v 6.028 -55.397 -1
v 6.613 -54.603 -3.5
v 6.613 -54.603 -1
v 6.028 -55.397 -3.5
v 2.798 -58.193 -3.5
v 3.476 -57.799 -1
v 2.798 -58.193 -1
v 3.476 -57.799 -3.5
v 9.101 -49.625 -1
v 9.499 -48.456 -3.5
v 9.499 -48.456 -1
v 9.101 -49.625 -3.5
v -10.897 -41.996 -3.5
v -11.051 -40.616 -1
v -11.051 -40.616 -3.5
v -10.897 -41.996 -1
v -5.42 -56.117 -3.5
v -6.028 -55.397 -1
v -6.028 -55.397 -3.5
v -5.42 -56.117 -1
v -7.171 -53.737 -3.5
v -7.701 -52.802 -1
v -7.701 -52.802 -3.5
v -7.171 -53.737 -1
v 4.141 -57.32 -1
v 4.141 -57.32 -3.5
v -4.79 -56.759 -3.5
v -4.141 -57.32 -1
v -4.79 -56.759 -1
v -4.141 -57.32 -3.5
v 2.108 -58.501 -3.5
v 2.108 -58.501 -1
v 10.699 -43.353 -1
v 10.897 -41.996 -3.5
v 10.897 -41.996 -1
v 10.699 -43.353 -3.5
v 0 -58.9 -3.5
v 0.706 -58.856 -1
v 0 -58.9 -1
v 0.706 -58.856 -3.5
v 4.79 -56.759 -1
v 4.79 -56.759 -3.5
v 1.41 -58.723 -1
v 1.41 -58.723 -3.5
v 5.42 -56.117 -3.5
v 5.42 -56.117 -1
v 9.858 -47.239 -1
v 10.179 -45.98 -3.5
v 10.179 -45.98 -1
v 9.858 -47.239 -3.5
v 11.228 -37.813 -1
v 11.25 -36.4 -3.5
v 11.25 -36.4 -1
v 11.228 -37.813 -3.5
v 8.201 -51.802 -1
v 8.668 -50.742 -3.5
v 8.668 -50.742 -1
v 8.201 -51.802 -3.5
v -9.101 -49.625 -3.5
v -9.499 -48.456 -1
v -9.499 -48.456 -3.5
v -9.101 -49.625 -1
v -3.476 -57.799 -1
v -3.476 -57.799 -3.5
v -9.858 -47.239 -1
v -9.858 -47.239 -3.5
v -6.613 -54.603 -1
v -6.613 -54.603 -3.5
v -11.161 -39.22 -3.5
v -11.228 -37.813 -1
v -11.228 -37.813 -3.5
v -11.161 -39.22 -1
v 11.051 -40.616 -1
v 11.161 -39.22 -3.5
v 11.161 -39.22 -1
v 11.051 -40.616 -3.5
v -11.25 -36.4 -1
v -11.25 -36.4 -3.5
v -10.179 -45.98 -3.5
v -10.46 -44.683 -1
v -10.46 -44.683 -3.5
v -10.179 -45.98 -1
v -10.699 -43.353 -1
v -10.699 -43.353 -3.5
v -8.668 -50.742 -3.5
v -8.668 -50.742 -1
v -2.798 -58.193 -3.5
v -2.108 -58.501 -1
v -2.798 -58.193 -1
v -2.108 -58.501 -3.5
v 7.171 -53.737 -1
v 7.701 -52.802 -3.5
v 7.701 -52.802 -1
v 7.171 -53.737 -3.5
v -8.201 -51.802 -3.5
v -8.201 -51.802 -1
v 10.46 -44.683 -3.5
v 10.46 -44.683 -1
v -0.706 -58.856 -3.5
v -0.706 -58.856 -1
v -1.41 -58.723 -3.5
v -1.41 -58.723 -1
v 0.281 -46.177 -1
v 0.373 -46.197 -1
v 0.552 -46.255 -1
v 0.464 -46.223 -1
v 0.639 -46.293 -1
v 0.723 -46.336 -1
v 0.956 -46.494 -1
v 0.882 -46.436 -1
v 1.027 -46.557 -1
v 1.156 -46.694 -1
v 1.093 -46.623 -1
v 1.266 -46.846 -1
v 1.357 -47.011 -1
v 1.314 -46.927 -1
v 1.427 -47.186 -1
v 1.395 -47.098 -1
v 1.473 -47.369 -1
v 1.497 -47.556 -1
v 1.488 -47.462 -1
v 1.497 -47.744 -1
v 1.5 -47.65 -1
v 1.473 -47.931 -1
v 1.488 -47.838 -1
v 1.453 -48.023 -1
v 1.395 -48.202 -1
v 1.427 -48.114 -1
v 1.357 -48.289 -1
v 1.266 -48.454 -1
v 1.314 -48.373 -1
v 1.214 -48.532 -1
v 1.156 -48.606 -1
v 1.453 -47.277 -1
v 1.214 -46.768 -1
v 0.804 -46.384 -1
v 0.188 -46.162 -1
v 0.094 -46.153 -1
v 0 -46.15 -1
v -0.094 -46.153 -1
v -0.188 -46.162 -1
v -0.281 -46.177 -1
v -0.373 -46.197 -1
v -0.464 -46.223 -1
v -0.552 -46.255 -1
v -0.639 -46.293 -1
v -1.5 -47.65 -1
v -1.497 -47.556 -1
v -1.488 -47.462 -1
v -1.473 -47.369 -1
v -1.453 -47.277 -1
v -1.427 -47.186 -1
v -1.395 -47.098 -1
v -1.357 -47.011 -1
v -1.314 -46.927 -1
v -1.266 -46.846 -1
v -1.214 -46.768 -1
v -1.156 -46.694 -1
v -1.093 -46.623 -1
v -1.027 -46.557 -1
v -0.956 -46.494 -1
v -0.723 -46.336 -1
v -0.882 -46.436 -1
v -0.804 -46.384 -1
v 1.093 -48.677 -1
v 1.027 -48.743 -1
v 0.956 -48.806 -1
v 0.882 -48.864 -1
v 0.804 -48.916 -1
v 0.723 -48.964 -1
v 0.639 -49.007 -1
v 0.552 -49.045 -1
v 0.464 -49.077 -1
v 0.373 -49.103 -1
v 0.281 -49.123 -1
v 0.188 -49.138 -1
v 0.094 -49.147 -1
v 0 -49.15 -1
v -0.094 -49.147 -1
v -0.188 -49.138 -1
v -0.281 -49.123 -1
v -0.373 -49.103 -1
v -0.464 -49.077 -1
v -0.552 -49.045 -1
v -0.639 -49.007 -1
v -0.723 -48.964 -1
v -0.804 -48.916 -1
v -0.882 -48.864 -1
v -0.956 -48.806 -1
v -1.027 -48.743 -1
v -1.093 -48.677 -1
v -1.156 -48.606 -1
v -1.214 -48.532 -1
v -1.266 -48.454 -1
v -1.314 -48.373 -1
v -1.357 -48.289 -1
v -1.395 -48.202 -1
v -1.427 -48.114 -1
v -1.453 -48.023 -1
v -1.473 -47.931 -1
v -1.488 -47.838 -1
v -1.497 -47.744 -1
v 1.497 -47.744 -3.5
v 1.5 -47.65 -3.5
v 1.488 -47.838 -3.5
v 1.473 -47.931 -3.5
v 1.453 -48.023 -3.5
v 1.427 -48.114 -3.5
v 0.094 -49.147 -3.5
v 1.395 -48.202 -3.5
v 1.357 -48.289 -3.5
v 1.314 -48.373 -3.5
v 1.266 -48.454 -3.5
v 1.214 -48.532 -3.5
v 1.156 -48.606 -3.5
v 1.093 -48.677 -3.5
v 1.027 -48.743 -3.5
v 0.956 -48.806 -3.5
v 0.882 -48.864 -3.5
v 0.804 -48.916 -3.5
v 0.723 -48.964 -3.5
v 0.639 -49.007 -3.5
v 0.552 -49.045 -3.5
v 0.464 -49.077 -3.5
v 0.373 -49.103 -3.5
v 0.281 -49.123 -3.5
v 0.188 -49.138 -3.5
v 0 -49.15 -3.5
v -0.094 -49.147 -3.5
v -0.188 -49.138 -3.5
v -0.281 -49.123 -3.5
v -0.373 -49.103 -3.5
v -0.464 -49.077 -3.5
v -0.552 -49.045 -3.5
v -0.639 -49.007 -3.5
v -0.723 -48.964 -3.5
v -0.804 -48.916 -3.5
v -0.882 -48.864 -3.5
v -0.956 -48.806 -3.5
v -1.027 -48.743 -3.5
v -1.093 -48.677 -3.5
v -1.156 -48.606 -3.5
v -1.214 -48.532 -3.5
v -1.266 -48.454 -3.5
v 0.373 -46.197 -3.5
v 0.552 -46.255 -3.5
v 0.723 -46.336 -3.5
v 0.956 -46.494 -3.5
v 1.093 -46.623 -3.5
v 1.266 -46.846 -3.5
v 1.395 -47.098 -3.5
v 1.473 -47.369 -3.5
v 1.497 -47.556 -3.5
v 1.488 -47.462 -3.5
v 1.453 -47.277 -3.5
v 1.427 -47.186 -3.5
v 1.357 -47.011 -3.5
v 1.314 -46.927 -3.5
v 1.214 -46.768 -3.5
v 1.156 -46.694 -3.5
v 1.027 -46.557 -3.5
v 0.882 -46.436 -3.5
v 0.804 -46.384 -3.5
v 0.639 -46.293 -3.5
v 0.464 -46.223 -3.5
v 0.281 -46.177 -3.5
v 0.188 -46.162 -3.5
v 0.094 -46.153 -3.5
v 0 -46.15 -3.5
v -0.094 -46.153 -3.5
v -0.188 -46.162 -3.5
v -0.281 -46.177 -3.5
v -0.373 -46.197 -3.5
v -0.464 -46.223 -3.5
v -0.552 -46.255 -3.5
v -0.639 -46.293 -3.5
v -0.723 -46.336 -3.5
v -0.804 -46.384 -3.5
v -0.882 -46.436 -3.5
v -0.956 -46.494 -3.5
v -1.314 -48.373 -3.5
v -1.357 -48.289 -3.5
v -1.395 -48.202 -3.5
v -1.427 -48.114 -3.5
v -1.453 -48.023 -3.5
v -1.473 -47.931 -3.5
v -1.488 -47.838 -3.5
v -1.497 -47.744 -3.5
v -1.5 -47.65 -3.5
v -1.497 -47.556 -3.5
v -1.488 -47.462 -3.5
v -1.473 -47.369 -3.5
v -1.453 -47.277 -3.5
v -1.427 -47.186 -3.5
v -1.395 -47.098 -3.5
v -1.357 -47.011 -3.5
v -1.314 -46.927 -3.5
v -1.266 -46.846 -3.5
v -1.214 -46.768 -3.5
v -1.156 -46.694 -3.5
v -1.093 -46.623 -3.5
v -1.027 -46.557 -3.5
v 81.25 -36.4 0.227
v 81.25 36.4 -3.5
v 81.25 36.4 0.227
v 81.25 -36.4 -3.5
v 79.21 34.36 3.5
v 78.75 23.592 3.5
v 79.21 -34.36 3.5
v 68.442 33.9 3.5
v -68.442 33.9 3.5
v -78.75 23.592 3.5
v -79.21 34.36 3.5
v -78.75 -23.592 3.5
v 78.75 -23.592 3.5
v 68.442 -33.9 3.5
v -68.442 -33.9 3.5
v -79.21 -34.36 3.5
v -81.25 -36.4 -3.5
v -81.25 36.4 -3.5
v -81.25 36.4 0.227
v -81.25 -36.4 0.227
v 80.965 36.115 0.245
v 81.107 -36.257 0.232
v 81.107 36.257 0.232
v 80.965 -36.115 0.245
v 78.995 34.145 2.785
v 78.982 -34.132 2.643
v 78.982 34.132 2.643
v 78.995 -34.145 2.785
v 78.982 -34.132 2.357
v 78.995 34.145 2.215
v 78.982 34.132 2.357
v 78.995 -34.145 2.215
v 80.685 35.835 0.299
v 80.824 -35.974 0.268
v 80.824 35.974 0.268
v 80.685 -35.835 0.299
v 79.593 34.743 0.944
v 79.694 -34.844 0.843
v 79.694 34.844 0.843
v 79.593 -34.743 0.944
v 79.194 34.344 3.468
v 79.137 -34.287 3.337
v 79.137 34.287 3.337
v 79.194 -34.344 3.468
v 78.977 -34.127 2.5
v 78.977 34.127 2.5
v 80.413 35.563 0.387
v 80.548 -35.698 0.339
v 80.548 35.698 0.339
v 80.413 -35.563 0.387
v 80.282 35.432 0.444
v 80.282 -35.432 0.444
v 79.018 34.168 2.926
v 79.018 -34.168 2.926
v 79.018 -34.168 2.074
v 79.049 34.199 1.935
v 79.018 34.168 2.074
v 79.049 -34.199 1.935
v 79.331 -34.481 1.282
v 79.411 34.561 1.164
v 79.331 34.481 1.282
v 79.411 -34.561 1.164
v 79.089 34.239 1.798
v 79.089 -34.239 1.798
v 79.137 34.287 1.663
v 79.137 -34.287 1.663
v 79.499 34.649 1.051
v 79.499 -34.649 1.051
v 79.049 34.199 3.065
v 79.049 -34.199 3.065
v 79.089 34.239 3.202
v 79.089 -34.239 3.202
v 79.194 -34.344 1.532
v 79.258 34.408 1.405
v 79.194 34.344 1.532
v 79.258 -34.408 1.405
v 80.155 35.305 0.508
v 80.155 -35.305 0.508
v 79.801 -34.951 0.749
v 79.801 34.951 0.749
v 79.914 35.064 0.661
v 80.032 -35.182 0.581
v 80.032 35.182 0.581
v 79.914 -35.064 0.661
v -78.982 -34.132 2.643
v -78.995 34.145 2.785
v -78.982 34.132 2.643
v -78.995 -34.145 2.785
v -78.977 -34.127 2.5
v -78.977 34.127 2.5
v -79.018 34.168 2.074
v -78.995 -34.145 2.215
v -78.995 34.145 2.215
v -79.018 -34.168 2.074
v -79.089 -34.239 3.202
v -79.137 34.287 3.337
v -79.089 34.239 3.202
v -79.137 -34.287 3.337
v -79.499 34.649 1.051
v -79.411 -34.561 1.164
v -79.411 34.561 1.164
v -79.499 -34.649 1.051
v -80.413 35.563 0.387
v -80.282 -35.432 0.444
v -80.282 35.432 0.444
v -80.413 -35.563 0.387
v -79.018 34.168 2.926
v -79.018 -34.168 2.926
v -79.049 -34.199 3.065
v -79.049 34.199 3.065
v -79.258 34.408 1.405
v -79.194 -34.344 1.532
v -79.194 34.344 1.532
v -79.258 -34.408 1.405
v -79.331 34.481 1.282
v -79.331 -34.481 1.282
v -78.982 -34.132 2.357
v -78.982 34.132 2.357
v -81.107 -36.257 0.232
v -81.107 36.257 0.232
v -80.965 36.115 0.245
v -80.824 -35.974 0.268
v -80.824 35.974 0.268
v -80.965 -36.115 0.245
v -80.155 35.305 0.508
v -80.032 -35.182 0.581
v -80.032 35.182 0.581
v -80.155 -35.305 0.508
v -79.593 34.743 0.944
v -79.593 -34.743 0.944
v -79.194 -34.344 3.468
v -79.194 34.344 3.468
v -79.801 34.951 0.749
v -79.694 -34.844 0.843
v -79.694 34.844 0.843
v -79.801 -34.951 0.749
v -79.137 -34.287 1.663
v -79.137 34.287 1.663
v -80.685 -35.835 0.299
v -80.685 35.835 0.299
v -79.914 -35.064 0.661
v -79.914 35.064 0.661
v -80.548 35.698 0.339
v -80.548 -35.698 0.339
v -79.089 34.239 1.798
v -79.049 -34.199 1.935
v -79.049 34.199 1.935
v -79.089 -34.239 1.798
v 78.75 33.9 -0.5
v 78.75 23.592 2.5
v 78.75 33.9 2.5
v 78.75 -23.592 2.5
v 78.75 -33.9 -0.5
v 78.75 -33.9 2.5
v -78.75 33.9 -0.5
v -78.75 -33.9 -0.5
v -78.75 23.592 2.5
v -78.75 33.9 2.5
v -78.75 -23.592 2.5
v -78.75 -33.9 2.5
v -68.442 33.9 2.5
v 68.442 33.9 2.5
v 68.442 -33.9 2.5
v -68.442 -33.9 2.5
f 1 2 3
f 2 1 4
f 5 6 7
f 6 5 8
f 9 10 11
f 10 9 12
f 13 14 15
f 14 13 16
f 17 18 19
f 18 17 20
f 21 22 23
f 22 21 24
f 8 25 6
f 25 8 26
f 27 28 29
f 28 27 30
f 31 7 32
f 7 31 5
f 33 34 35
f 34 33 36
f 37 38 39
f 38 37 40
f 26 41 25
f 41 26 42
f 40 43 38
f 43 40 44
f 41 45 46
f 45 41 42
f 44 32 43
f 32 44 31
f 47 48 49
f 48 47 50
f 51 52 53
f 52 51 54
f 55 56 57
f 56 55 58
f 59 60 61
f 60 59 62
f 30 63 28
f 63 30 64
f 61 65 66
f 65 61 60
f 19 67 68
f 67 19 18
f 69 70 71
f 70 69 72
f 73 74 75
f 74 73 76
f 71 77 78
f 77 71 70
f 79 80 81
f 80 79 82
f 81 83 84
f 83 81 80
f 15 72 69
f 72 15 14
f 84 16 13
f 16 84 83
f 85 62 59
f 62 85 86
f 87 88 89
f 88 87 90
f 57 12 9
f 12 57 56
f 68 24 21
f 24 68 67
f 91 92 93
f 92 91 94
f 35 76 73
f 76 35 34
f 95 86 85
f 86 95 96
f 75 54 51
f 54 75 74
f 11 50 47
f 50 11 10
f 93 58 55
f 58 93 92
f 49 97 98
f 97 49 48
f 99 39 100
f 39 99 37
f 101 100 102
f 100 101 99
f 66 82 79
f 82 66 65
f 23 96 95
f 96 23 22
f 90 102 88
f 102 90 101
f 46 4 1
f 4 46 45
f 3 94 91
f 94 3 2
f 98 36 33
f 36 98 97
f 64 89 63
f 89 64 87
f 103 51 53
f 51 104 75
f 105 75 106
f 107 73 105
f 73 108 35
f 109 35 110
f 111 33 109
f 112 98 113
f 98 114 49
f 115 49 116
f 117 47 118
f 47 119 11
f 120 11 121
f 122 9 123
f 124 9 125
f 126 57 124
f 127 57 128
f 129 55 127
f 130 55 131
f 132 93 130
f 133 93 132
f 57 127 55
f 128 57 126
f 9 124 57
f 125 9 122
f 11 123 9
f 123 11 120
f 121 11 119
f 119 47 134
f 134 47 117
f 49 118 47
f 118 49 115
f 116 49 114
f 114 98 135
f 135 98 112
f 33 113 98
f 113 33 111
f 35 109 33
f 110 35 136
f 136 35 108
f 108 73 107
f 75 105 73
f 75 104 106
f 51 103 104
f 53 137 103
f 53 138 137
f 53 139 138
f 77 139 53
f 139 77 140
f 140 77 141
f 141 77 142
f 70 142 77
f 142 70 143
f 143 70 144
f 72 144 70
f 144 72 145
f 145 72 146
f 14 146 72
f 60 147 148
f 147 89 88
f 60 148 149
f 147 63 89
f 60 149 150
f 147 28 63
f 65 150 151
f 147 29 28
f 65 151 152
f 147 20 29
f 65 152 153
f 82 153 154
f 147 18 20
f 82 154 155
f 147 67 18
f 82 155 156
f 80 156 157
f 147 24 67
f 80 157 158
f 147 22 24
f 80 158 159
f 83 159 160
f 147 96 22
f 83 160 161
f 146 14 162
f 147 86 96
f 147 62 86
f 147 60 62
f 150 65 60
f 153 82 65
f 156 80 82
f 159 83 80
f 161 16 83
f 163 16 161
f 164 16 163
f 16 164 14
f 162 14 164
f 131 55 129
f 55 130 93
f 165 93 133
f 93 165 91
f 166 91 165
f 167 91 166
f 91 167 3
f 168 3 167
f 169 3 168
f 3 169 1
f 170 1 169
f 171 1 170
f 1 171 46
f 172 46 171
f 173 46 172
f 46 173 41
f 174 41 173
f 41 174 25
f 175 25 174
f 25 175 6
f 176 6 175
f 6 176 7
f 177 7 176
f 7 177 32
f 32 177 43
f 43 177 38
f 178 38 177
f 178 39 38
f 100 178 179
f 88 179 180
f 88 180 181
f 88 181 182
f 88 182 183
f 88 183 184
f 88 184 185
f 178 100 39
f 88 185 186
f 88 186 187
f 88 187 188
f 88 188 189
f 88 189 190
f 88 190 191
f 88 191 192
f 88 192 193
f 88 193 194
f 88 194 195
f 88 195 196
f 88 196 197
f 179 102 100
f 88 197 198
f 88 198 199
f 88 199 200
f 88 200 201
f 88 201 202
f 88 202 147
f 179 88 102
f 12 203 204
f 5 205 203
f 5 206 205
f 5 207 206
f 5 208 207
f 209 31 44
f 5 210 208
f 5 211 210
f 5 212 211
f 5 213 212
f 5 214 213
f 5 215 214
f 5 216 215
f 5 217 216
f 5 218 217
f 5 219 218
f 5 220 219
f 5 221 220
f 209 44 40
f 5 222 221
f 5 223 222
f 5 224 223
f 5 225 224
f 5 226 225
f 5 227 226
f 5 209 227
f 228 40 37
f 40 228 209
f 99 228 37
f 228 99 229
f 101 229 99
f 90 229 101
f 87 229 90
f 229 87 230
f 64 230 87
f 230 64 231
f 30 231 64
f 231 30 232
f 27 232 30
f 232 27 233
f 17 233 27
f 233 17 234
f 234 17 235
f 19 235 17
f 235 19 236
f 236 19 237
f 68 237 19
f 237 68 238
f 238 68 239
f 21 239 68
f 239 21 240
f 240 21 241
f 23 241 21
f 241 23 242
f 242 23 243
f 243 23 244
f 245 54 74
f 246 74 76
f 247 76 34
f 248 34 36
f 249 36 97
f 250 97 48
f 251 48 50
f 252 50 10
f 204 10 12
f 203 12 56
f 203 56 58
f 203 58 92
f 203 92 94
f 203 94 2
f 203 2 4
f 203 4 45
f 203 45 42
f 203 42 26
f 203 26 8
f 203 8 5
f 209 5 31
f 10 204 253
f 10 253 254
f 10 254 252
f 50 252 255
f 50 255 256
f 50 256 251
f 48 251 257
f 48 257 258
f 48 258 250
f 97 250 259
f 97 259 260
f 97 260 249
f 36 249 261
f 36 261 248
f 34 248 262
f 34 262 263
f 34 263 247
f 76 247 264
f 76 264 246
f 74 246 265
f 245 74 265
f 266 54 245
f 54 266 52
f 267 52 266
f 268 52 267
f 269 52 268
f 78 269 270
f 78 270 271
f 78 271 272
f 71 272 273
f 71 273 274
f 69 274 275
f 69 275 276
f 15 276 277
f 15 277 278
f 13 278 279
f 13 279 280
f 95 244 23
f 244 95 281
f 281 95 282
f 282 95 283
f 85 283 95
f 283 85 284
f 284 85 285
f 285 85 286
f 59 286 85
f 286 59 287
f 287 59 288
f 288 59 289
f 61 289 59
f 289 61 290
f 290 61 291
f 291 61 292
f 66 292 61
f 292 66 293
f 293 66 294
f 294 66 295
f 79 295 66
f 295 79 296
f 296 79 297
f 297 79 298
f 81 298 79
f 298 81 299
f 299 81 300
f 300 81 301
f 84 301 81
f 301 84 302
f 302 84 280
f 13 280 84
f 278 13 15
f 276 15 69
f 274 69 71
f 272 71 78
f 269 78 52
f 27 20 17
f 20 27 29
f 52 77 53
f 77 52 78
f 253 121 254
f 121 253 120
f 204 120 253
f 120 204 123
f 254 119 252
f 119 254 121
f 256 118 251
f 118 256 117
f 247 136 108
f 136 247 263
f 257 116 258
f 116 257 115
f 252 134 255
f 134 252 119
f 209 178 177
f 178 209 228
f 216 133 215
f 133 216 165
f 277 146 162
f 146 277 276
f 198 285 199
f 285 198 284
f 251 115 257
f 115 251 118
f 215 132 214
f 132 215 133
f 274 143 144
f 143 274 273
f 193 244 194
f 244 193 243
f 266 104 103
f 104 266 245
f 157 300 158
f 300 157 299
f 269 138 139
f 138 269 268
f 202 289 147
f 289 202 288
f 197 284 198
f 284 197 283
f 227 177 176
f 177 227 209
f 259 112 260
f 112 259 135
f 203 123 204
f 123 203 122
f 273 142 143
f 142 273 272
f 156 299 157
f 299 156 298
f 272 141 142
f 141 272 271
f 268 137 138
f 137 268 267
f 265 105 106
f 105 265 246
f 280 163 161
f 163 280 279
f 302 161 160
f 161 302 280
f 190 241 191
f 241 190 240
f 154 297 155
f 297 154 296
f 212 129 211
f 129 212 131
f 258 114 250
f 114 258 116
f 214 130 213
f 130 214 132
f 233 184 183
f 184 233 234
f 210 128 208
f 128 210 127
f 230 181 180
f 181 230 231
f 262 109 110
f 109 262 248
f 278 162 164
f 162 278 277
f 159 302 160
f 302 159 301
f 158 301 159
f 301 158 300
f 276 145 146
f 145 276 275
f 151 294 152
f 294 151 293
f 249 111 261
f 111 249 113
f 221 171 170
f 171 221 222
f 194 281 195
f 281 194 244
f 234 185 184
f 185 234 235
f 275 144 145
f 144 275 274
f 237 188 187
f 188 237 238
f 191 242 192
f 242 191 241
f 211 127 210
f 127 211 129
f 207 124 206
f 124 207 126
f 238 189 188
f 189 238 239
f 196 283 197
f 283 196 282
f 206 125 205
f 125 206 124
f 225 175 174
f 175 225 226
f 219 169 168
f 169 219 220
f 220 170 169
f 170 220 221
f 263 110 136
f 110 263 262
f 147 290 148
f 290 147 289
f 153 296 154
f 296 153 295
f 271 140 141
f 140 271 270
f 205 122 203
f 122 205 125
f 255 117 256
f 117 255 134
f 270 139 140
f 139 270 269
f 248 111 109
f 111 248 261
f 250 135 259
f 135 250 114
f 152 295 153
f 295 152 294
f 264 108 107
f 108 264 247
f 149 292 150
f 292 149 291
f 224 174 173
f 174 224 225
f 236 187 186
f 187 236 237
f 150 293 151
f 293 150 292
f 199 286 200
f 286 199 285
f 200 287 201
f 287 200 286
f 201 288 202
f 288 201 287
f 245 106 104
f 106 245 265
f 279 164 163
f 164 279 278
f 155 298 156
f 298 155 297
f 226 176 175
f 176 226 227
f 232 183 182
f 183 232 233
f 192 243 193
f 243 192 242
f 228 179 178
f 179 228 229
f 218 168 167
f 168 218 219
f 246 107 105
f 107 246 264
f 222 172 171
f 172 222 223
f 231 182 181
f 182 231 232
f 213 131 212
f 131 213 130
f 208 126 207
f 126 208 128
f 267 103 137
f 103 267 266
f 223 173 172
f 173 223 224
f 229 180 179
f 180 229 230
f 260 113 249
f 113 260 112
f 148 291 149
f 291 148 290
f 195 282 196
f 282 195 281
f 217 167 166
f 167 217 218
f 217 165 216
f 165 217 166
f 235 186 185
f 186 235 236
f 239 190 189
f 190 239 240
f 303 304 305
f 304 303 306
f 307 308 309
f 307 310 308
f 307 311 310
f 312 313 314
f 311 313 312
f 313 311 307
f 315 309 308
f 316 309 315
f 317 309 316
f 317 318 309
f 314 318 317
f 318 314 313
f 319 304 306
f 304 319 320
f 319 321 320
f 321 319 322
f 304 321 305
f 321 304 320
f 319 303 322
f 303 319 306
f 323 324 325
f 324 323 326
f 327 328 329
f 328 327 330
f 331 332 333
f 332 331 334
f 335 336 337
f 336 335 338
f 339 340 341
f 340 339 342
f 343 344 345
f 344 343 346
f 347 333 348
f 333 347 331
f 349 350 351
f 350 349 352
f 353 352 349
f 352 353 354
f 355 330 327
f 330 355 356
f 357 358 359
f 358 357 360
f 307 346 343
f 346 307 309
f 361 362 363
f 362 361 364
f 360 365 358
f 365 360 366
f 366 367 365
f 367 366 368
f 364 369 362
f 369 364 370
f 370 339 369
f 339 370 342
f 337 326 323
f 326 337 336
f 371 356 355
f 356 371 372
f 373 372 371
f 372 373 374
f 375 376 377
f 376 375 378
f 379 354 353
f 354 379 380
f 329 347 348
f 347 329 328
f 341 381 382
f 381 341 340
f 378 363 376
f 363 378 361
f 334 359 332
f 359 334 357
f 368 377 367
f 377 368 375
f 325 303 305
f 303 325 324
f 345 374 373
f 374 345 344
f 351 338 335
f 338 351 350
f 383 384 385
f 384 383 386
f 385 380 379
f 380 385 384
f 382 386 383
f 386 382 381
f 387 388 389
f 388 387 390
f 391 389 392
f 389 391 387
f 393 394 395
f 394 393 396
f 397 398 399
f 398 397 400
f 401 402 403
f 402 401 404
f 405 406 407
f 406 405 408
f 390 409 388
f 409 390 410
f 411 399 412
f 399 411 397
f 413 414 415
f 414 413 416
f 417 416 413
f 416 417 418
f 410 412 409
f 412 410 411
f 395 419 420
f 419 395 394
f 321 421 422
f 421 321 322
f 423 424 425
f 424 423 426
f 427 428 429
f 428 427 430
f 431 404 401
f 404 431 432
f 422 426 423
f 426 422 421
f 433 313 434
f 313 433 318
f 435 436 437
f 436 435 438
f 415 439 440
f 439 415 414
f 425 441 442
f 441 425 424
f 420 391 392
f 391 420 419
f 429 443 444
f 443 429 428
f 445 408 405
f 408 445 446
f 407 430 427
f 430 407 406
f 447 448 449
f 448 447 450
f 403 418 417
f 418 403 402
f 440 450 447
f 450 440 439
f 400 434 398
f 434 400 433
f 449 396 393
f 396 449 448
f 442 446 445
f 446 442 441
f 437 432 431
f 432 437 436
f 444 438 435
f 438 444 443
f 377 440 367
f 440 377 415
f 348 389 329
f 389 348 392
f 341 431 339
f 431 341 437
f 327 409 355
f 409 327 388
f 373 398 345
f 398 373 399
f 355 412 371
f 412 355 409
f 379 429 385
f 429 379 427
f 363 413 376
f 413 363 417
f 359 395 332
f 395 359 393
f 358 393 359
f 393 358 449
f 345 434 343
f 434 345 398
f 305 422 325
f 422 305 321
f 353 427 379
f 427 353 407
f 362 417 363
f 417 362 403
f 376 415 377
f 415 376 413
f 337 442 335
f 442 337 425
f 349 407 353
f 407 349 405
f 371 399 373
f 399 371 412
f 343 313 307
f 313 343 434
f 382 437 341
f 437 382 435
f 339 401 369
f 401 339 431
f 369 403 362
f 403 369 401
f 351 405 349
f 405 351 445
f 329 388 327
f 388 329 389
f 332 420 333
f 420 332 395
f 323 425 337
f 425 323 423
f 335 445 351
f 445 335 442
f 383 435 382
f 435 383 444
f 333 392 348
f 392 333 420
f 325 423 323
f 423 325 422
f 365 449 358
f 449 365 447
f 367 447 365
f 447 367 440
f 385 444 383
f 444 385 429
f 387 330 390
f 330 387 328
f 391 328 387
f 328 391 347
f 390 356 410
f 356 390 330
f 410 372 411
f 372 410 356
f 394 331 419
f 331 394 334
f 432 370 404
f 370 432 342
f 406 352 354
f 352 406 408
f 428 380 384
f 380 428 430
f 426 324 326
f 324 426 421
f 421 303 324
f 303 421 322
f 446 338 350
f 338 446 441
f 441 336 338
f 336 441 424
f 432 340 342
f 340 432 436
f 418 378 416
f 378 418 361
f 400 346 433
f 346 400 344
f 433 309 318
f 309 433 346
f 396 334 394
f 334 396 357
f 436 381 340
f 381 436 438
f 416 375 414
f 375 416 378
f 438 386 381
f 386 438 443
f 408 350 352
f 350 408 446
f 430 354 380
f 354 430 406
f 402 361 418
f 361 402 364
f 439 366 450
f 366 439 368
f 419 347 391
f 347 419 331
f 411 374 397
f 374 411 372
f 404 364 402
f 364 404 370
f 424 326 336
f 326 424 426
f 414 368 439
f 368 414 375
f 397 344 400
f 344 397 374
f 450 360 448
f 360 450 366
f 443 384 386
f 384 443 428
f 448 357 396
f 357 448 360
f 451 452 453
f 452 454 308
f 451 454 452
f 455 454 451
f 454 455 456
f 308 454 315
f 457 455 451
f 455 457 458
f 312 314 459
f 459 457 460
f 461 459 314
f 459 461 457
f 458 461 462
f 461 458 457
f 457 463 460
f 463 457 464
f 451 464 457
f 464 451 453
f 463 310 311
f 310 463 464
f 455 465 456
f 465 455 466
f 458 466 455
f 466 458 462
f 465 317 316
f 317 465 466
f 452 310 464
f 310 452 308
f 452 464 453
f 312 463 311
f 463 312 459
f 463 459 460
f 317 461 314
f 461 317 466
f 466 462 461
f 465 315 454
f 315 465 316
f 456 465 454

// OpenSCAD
//------------------Variables------------------\\ 

		//----Global Values----\\
			//The default unit in OpenSCAD is mm and this unit variable allows one to change the variables in the code with units other than mm. Default is 1, for mm, but cm is 10 and inches is 25.4. Note that this entails that you change EVERY variable (except maybe sfn)  so that one piece of the model is not ridiculously bigger/smaller than the other parts. 
				unit=1;

			//The detail in the cylinders/spheres of the shape.
				sfn=100;

		//----Bill Specifics----\\

			//The length of the bill.
				billength= 157.5;

			//The width of the bill. 
				billwidth = 67.8;

			//The thickness of the frame. 
				framethick = 5;
			
			//Bottom Thickness
				botthick = 2 ;

		//----Frame Specifics----\\

			//The border of the frame length-wise. This is the measurement from the inside of the frame to the outisde on the length (x) axis. The cylinders that shape the frame use this measurement.
				xframe = 5;

			//The border of the frame width-wise. This is the measurement from the inside of the frame to the outisde on the width (y) axis.
				yframe = 5;
		
			//How prominent the frame shaping is. Play with this value. Default is 1.1.
				frameshapethick = 1.1;

			//How raised the frame shaping is. Play with this value as well. 
				frameshaperaise = 0;


	//----Bill holder----\\
	billholdx=5*unit;
	billholdz=1*unit;
	billholdlift=2.5*unit;
	
	//----Hook sizing----\\
		//Hook size
		hooksize=22.5;

		//Hook hole size
		hookhole=3;

		//Hook thickness
		hookthick=2.5;

//-------------------Modules-------------------\\ 

	//----Basic Frame Shapes----\\
		module bill() {
			cube([billength*unit, billwidth*unit,framethick*unit], center=true);
		}

		module outsideframe() { 
			cube([(billength+xframe)*unit, (billwidth+yframe)*unit, (framethick+botthick)*unit], center=true);
		}

	//----Frame shaping.----\\
		//Frame shaping cylinder on the X Axis.
			module xfsc() {
				cylinder(r=(framethick*unit)/(frameshapethick*2), h=(billwidth+yframe)*unit+xframe, center=true, $fn=sfn);
			}

		//Frame shaping cylinder on the Y Axis.
			module yfsc() {
				cylinder(r=(framethick*unit)/(frameshapethick*2), h=(billength+xframe)*unit+yframe, center=true, $fn=sfn);
			}

		//Frameshaping general module
			module frameshaping() {
				translate([(billength/2)*unit+xframe/2, 0, (framethick/2)*unit]) {
					rotate([90,0,0]) {
						xfsc();
					}
				}
				translate([(-billength/2)*unit-xframe/2, 0, (framethick/2)*unit]) {
					rotate([90,0,0]) {
						xfsc();
					}
				}

				translate([0, (billwidth/2)*unit+yframe/2, (framethick/2)*unit]) {
					rotate([90,0,90]) {
						yfsc();
					}
				}
				translate([0, (-billwidth/2)*unit-yframe/2, (framethick/2)*unit]) {
					rotate([90,0,90]) {
						yfsc();
					}
				}
			}

	






module billhold(){
	translate([billength/2-billholdx/1.375+0.25, billwidth/2-billholdx/1.375+0.25, billholdlift]) {
		rotate([0,0,45]) {
			scale([1,1.75,1]){
				cylinder($fn=3, r=billholdx, h=billholdz);
			}
		}
	}

	translate([-billength/2+billholdx/1.375-0.25, billwidth/2-billholdx/1.375+0.25, billholdlift]) {
		rotate([0,0,135]) {
			scale([1,1.75,1]){
				cylinder($fn=3, r=billholdx, h=billholdz);
			}
		}
	}
	translate([-billength/2+billholdx/1.375-0.25, -billwidth/2+billholdx/1.375-0.25, billholdlift]) {
		rotate([0,0,225]) {
			scale([1,1.75,1]){
				cylinder($fn=3, r=billholdx, h=billholdz);
			}
		}
	}

	translate([billength/2-billholdx/1.375+0.25, -billwidth/2+billholdx/1.375-0.25, billholdlift]) {
		rotate([0,0,315]) {
			scale([1,1.75,1]){
				cylinder($fn=3, r=billholdx, h=billholdz);
			}
		}
	}





}
		
	module hook() {
		translate([0,-((billwidth+xframe)/2)*unit, (-(framethick+botthick)/2)*unit ]) {
			difference() {
				scale([1,2,1]) {
					cylinder(r=(hooksize/2)*unit, h=hookthick*unit, $fn=sfn);
				}
				translate([(-hooksize/2)*unit, 0]) {
					cube([hooksize*unit, hooksize*unit, hookthick*unit]);
				}
				translate([0, (-hooksize/2)*unit, 0]) {
					cylinder(r=(hookhole/2)*unit, h=hookthick*unit, $fn=sfn);
				}
			}
		}
	}


	//Plating module
	module frame1() {
		difference() {
			union(){
				outsideframe();
				hook();
			}
			translate([0,0, botthick]) {
				bill();
			}
			translate([0,0, frameshaperaise]) {
				frameshaping();
			}
			
		}
	}

	module frame(){
	frame1();
	billhold();
}

frame();
